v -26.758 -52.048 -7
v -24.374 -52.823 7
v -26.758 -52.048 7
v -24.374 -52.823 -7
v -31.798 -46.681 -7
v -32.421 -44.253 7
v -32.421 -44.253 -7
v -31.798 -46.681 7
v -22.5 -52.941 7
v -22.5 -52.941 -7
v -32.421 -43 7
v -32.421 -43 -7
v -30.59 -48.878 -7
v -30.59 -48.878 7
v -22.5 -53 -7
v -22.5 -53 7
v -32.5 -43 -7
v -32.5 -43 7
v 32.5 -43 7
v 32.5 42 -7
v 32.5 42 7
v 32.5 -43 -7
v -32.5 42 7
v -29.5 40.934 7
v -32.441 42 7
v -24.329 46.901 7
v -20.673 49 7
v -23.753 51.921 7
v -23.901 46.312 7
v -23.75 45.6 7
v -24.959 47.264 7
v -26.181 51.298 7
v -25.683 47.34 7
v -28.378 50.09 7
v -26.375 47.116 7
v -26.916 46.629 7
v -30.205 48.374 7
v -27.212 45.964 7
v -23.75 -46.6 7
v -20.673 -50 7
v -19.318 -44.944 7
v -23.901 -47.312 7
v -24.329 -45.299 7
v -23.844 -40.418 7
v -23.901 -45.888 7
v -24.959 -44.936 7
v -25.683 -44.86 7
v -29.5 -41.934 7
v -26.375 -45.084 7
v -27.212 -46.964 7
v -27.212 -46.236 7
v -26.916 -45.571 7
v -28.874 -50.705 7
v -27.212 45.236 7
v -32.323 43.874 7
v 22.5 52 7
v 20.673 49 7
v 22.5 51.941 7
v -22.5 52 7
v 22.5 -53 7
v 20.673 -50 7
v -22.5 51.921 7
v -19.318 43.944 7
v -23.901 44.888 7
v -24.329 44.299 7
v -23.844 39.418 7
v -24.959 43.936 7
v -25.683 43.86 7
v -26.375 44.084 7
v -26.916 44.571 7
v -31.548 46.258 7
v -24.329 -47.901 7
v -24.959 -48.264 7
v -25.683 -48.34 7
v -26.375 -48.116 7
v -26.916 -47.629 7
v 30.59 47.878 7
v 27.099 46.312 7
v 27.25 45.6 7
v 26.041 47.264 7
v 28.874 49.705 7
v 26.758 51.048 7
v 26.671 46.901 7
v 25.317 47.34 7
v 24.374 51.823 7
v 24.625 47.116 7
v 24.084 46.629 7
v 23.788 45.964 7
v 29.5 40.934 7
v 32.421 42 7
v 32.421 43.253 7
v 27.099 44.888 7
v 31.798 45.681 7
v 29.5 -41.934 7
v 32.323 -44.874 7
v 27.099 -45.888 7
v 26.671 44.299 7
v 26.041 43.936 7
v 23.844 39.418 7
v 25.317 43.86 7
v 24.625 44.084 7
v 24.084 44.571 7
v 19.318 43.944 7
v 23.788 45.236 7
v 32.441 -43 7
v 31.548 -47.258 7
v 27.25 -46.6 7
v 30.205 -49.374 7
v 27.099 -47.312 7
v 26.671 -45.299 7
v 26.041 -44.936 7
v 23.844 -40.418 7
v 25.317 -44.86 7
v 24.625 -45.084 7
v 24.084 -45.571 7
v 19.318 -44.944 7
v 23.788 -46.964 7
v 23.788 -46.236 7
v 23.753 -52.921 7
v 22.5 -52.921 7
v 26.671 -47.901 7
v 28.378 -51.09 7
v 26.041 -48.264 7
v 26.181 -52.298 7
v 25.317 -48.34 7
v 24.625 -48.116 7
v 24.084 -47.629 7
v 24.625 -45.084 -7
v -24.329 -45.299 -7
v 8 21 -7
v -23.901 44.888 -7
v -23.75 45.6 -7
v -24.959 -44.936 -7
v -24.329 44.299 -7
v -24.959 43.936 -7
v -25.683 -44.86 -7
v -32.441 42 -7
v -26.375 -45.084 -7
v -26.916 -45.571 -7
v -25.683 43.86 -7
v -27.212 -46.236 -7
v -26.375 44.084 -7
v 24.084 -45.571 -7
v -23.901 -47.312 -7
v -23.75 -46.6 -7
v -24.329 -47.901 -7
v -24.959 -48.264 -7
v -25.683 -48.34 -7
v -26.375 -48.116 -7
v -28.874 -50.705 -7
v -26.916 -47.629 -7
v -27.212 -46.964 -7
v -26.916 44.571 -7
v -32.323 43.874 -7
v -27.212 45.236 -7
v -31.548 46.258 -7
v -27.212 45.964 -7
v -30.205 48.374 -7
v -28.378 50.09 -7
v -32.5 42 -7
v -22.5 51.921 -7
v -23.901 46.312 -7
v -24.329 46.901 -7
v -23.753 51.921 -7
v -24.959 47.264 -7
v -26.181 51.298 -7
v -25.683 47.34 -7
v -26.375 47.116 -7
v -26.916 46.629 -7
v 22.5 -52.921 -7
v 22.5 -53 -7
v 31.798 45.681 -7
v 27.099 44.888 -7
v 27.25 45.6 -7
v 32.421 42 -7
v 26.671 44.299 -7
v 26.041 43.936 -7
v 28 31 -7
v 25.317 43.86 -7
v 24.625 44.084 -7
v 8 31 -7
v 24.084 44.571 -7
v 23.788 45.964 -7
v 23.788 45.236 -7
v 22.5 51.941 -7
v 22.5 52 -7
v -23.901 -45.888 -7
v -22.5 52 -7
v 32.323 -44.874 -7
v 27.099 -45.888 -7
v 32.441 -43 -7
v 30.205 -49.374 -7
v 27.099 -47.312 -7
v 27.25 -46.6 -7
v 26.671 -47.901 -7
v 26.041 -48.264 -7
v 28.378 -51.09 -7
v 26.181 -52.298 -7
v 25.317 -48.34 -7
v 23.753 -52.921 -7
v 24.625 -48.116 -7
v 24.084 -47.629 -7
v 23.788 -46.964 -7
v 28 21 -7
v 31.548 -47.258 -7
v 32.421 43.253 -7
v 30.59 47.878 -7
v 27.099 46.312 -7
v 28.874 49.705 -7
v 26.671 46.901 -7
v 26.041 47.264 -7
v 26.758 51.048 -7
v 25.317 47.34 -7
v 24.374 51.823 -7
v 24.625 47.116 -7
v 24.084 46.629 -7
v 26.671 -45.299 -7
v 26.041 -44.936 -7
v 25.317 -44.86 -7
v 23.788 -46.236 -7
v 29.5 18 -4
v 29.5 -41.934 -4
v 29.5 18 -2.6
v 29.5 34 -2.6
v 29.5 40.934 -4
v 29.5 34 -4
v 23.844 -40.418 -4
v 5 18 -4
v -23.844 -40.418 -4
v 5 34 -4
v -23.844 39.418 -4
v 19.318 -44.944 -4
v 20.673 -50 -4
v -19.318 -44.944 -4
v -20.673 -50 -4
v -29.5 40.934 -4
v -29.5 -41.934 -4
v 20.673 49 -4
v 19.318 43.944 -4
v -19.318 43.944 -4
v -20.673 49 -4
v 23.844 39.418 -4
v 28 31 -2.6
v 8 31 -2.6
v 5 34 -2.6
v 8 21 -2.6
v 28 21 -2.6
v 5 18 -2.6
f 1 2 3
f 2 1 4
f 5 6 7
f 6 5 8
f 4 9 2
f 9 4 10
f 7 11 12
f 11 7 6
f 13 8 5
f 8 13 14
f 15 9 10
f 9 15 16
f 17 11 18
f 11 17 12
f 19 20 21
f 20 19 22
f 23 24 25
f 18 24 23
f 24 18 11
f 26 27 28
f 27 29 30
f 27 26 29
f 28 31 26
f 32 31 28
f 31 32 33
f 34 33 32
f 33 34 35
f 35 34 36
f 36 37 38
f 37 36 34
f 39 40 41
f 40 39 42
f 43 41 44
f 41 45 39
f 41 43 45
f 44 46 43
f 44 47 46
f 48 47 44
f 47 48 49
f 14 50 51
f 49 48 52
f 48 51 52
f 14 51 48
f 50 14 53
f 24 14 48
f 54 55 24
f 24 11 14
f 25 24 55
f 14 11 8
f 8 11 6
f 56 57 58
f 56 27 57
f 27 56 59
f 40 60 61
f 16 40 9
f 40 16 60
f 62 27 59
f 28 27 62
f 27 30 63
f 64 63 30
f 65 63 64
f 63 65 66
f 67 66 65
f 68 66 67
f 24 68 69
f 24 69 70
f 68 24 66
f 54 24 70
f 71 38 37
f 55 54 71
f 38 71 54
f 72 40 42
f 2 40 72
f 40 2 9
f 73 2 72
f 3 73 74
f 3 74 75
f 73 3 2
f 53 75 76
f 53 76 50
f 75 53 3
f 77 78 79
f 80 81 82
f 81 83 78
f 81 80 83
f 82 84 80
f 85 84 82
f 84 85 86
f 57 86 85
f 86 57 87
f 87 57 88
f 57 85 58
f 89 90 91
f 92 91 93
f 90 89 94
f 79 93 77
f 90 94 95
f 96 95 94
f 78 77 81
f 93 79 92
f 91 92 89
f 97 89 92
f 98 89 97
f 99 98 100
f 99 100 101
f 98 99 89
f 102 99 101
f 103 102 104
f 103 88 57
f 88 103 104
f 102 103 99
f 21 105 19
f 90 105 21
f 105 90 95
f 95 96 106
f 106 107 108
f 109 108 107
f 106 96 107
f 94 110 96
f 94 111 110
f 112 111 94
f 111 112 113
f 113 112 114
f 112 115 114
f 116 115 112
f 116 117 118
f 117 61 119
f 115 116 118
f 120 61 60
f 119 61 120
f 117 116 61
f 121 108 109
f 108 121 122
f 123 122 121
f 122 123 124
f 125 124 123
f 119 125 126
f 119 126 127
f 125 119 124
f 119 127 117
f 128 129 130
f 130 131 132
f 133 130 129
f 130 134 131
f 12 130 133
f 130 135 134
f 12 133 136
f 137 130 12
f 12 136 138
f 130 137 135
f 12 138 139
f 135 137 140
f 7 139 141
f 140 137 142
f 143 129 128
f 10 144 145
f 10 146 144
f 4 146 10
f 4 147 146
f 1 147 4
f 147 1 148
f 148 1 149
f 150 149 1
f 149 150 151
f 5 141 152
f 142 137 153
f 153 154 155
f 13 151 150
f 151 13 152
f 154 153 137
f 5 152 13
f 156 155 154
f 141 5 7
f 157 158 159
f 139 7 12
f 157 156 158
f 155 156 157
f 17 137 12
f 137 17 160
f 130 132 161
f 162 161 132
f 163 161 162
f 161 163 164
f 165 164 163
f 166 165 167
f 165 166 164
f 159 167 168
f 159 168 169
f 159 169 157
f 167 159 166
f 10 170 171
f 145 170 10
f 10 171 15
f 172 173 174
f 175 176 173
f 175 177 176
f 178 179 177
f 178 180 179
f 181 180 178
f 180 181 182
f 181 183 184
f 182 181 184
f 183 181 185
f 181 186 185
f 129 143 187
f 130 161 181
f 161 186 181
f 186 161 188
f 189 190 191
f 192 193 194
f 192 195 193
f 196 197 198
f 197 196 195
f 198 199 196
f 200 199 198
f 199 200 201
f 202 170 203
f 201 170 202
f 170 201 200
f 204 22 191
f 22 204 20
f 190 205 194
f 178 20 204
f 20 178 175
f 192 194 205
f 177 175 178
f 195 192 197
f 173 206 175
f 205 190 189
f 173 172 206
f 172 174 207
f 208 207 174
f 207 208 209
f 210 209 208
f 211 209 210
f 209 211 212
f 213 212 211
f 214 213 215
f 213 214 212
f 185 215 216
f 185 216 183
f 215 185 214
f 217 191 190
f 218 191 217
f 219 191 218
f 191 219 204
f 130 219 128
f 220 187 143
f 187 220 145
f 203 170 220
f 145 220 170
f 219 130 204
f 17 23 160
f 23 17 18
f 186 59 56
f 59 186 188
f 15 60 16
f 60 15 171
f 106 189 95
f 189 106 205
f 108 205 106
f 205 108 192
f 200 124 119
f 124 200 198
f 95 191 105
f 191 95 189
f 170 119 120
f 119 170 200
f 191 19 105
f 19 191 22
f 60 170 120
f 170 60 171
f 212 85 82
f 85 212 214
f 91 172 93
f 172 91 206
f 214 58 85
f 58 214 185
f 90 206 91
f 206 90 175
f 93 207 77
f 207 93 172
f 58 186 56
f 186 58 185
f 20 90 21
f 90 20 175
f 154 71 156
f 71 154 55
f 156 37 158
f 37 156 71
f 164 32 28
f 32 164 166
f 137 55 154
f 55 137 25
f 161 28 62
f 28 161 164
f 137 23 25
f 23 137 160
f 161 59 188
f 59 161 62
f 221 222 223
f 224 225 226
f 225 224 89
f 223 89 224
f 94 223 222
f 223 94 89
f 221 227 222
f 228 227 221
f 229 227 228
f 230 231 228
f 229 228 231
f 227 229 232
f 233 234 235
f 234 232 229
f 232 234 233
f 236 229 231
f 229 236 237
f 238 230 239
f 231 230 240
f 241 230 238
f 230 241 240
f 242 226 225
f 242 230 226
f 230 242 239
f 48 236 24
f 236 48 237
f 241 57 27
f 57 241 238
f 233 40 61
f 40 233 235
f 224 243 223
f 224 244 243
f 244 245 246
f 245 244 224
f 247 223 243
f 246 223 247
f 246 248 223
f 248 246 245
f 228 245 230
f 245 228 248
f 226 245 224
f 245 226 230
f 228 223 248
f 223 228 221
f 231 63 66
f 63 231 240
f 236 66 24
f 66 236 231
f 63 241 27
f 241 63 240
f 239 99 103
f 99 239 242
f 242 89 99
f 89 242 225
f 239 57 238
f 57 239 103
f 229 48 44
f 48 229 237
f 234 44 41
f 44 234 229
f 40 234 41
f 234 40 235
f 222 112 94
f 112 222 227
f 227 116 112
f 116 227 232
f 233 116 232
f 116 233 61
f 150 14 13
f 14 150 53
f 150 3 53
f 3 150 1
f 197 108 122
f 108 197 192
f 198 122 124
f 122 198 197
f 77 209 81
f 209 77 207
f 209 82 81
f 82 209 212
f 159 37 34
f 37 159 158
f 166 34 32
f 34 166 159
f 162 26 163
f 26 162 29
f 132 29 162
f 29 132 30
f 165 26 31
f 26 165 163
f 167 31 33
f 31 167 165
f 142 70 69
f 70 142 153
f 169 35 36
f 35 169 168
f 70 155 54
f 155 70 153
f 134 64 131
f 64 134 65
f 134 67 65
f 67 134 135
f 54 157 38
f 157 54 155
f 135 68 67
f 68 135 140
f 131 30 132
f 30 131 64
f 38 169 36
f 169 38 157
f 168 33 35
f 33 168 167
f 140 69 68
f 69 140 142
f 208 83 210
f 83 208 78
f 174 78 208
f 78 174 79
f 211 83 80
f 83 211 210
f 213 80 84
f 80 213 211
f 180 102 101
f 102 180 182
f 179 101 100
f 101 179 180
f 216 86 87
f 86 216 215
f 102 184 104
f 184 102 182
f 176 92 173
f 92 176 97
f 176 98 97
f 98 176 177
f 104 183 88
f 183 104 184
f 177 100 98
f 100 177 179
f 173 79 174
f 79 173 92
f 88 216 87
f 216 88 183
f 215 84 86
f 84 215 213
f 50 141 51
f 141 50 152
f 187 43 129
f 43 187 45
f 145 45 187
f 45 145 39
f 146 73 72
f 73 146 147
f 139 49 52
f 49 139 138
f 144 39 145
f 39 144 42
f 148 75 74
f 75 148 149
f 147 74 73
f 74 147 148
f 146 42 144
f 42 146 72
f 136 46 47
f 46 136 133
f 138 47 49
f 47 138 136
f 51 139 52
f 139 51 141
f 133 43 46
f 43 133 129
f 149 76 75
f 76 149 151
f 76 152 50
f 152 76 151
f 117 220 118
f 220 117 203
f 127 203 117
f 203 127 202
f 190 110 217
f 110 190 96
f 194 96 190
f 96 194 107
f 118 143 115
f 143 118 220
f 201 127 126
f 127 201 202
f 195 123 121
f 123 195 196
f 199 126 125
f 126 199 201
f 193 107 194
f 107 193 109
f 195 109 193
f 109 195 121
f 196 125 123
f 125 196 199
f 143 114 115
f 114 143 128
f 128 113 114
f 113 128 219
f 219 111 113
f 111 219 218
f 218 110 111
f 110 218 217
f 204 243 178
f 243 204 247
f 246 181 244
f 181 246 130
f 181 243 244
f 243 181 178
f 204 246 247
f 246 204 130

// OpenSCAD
$fn=25;

//maketop();
//makelcdbezel();
//makedialbase();
//makedialtop();
makebottom();

module makebottom()
{
  render() difference()
  {
    render() union()
    {
      render() difference()
      {
        translate([0,-0.5,0]) roundedbox(55+4+6,96+3+6,14,10);
        translate([0,-0.5,3]) roundedbox(55+4,96+3,14,7);
      }
      translate([32-10-4,52.5-0.5-5-21,-5.5+1.9]) cube([26,16,2],center=true);
      translate([-24-1.5,(96/2)-0.5-1.9,0]) rotate([0,0,45]) cylinder(h=14,r1=12.8/2,r2=12.8/2,$fn=6,center=true);
      translate([24+1.5,(96/2)-0.5-1.9,0]) rotate([0,0,-45]) cylinder(h=14,r1=12.8/2,r2=12.8/2,$fn=6,center=true);
      translate([-24-1.5,-(96/2)-0.5+1.9,0]) rotate([0,0,15]) cylinder(h=14,r1=12.8/2,r2=12.8/2,$fn=6,center=true);
      translate([24+1.5,-(96/2)-0.5+1.9,0]) rotate([0,0,-15]) cylinder(h=14,r1=12.8/2,r2=12.8/2,$fn=6,center=true);
    }
    translate([-24-1.5,(96/2)-0.5-1.9,0]) cylinder(h=20,r1=3.5/2,r2=3.5/2,$fn=15,center=true);
    translate([24+1.5,(96/2)-0.5-1.9,0]) cylinder(h=20,r1=3.5/2,r2=3.5/2,$fn=15,center=true);
    translate([-24-1.5,-(96/2)-0.5+1.9,0]) cylinder(h=20,r1=3.5/2,r2=3.5/2,$fn=15,center=true);
    translate([24+1.5,-(96/2)-0.5+1.9,0]) cylinder(h=20,r1=3.5/2,r2=3.5/2,$fn=15,center=true);
    render() difference()
    {
      translate([0,-0.5,0]) roundedbox(100+55+4+6,100+96+3+6,18,10);
      translate([0,-0.5,0]) roundedbox(55+4+6,96+3+6,100,10);
    }
    translate([32-10-4,52.5-0.5-5-21,0]) cube([20,10,20],center=true);
  }
}

module makedialtop()
{
  union()
  {
    difference()
    {
      translate([0,0,0]) cylinder(h=7,r1=37/2,r2=35/2,$fn=50,center=true);
      translate([0,0,-3.5]) cylinder(h=6,r1=26.5/2,r2=26.5/2,$fn=50,center=true);
      translate([0,0,3.5]) cylinder(h=4,r1=31/2,r2=31/2,$fn=50,center=true);
      for(c=[0:20])
        rotate([0,0,c*(360/20)])
          translate([-19.75,0,0])
            rotate([0,15,0])
              cylinder(h=30,r1=4/2,r2=4/2,$fn=25,center=true);
    }
    translate([0,0,3.5-1.1]) cylinder(h=2.1,r1=5/2,r2=5/2,$fn=25,center=true);
  }
}

module makedialbase()
{
  rotate([180,0,0])
  {
    difference()
    {
      union()
      {
        translate([0,0,1]) cylinder(h=12,r1=18/2,r2=18/2,$fn=50,center=true);
        translate([0,0,1+6-1]) cylinder(h=2,r1=26/2,r2=26/2,$fn=50,center=true);
      }
      difference()
      {
        translate([0,0,0]) cylinder(h=20,r1=6.5/2,r2=6.5/2,center=true);
        translate([0,-(6.5/2)-0.5,10-1]) cube([10,4,20],center=true);
      }
    }
  }
}

module makelcdbezel()
{
  rotate([0,180,0])
  {
    difference()
    {
      translate([0,0,0]) roundedbox(27+6,15+6,1.5,2);
      translate([0,0,0]) cube([27,15,50],center=true);
      translate([0,0,-1]) cube([27+1.5,15+1.5,1.5],center=true);
    }
  }
}

module maketop()
{
  difference()
  {
    union()
    {
      difference()
      {
        translate([0,-0.5,0]) roundedbox(55+4+6,96+3+6,18,10);
        translate([0,-0.5,3]) roundedbox(55+4,96+3,18,7);
      }
      translate([0,-(96/2)+48-26.5,-9+5+1.5]) cylinder(h=10+3,r1=26/2,r2=26/2,$fn=25,center=true);
      translate([-14,-40,-9+5+1.5]) cube([5,5,10+3],center=true);
      translate([14,-40,-9+5+1.5]) cube([5,5,10+3],center=true);
      translate([-22,-18,-9+5+1.5]) cube([5,5,10+3],center=true);
      translate([22,-18,-9+5+1.5]) cube([5,5,10+3],center=true);
      translate([0,42,-9+1.5+1.5]) cube([20,5,3+3],center=true);
      translate([-24-1.5,(96/2)-0.5-1.9,0]) rotate([0,0,45]) cylinder(h=18,r1=12.8/2,r2=12.8/2,$fn=6,center=true);
      translate([24+1.5,(96/2)-0.5-1.9,0]) rotate([0,0,-45]) cylinder(h=18,r1=12.8/2,r2=12.8/2,$fn=6,center=true);
      translate([-24-1.5,-(96/2)-0.5+1.9,0]) rotate([0,0,15]) cylinder(h=18,r1=12.8/2,r2=12.8/2,$fn=6,center=true);
      translate([24+1.5,-(96/2)-0.5+1.9,0]) rotate([0,0,-15]) cylinder(h=18,r1=12.8/2,r2=12.8/2,$fn=6,center=true);
    }
    translate([0,0,0]) rotate([0,180,0]) controls();
    translate([-24-1.5,(96/2)-0.5-1.9,18-3.5]) rotate([0,0,45]) cylinder(h=18,r1=7/2,r2=7/2,$fn=6,center=true);
    translate([24+1.5,(96/2)-0.5-1.9,18-3.5]) rotate([0,0,-45]) cylinder(h=18,r1=7/2,r2=7/2,$fn=6,center=true);
    translate([-24-1.5,-(96/2)-0.5+1.9,18-3.5]) rotate([0,0,15]) cylinder(h=18,r1=7/2,r2=7/2,$fn=6,center=true);
    translate([24+1.5,-(96/2)-0.5+1.9,18-3.5]) rotate([0,0,-15]) cylinder(h=18,r1=7/2,r2=7/2,$fn=6,center=true);
    translate([-24-1.5,(96/2)-0.5-1.9,5]) cylinder(h=18,r1=3.5/2,r2=3.5/2,$fn=15,center=true);
    translate([24+1.5,(96/2)-0.5-1.9,5]) cylinder(h=18,r1=3.5/2,r2=3.5/2,$fn=15,center=true);
    translate([-24-1.5,-(96/2)-0.5+1.9,5]) cylinder(h=18,r1=3.5/2,r2=3.5/2,$fn=15,center=true);
    translate([24+1.5,-(96/2)-0.5+1.9,5]) cylinder(h=18,r1=3.5/2,r2=3.5/2,$fn=15,center=true);
    difference()
    {
      translate([0,-0.5,0]) roundedbox(100+55+4+6,100+96+3+6,18,10);
      translate([0,-0.5,0]) roundedbox(55+4+6,96+3+6,100,10);
    }
  }
}

module controls()
{
  translate([-(55/2)+5+(27/2)+4.5-1,-(96/2)+65.5+(15/2)-0.5,0]) cube([27+1,15+1,50],center=true);
  translate([(55/2)-9.5,-(96/2)+79,0]) cylinder(h=50,r1=8/2,r2=8/2,center=true);
  translate([(55/2)-9.5,-(96/2)+64,0]) cylinder(h=50,r1=8/2,r2=8/2,center=true);
  translate([-15.5,-(96/2)+48,0]) cylinder(h=50,r1=8/2,r2=8/2,center=true);
  translate([0,-(96/2)+48,0]) cylinder(h=50,r1=8/2,r2=8/2,center=true);
  translate([15.5,-(96/2)+48,0]) cylinder(h=50,r1=8/2,r2=8/2,center=true);
  translate([0,-(96/2)+48-26.5,0]) cylinder(h=50,r1=20/2,r2=20/2,$fn=25,center=true);
}

module roundedbox(l,d,h,r)
{
  difference()
  {
    difference()
    {
      difference()
      {
        difference()
        {
          cube([l,d,h],center=true);
          translate([-(l/2)+r,-(d/2)+r,0]){corner(r,h,0);};
        }
        translate([(l/2)-r,-(d/2)+r,0]){corner(r,h,90);};
      }
      translate([(l/2)-r,(d/2)-r,0]){corner(r,h,180);};
    }
    translate([-(l/2)+r,(d/2)-r,0]){corner(r,h,270);};
  }
}

module corner(r,h,ang)
{
  rotate([0,0,ang])
  {
    difference()
    {
      difference()
      {
        difference()
        {
          cylinder(h*2,r*2,r*2,center=true);
          cylinder(h*2,r,r,center=true);
        }
        translate([r*5,0,0]){cube([r*10,r*10,h*2],center=true);}
      }
      translate([0,r*5,0]){cube([r*10,r*10,h*2],center=true);}
    }
  }
}
